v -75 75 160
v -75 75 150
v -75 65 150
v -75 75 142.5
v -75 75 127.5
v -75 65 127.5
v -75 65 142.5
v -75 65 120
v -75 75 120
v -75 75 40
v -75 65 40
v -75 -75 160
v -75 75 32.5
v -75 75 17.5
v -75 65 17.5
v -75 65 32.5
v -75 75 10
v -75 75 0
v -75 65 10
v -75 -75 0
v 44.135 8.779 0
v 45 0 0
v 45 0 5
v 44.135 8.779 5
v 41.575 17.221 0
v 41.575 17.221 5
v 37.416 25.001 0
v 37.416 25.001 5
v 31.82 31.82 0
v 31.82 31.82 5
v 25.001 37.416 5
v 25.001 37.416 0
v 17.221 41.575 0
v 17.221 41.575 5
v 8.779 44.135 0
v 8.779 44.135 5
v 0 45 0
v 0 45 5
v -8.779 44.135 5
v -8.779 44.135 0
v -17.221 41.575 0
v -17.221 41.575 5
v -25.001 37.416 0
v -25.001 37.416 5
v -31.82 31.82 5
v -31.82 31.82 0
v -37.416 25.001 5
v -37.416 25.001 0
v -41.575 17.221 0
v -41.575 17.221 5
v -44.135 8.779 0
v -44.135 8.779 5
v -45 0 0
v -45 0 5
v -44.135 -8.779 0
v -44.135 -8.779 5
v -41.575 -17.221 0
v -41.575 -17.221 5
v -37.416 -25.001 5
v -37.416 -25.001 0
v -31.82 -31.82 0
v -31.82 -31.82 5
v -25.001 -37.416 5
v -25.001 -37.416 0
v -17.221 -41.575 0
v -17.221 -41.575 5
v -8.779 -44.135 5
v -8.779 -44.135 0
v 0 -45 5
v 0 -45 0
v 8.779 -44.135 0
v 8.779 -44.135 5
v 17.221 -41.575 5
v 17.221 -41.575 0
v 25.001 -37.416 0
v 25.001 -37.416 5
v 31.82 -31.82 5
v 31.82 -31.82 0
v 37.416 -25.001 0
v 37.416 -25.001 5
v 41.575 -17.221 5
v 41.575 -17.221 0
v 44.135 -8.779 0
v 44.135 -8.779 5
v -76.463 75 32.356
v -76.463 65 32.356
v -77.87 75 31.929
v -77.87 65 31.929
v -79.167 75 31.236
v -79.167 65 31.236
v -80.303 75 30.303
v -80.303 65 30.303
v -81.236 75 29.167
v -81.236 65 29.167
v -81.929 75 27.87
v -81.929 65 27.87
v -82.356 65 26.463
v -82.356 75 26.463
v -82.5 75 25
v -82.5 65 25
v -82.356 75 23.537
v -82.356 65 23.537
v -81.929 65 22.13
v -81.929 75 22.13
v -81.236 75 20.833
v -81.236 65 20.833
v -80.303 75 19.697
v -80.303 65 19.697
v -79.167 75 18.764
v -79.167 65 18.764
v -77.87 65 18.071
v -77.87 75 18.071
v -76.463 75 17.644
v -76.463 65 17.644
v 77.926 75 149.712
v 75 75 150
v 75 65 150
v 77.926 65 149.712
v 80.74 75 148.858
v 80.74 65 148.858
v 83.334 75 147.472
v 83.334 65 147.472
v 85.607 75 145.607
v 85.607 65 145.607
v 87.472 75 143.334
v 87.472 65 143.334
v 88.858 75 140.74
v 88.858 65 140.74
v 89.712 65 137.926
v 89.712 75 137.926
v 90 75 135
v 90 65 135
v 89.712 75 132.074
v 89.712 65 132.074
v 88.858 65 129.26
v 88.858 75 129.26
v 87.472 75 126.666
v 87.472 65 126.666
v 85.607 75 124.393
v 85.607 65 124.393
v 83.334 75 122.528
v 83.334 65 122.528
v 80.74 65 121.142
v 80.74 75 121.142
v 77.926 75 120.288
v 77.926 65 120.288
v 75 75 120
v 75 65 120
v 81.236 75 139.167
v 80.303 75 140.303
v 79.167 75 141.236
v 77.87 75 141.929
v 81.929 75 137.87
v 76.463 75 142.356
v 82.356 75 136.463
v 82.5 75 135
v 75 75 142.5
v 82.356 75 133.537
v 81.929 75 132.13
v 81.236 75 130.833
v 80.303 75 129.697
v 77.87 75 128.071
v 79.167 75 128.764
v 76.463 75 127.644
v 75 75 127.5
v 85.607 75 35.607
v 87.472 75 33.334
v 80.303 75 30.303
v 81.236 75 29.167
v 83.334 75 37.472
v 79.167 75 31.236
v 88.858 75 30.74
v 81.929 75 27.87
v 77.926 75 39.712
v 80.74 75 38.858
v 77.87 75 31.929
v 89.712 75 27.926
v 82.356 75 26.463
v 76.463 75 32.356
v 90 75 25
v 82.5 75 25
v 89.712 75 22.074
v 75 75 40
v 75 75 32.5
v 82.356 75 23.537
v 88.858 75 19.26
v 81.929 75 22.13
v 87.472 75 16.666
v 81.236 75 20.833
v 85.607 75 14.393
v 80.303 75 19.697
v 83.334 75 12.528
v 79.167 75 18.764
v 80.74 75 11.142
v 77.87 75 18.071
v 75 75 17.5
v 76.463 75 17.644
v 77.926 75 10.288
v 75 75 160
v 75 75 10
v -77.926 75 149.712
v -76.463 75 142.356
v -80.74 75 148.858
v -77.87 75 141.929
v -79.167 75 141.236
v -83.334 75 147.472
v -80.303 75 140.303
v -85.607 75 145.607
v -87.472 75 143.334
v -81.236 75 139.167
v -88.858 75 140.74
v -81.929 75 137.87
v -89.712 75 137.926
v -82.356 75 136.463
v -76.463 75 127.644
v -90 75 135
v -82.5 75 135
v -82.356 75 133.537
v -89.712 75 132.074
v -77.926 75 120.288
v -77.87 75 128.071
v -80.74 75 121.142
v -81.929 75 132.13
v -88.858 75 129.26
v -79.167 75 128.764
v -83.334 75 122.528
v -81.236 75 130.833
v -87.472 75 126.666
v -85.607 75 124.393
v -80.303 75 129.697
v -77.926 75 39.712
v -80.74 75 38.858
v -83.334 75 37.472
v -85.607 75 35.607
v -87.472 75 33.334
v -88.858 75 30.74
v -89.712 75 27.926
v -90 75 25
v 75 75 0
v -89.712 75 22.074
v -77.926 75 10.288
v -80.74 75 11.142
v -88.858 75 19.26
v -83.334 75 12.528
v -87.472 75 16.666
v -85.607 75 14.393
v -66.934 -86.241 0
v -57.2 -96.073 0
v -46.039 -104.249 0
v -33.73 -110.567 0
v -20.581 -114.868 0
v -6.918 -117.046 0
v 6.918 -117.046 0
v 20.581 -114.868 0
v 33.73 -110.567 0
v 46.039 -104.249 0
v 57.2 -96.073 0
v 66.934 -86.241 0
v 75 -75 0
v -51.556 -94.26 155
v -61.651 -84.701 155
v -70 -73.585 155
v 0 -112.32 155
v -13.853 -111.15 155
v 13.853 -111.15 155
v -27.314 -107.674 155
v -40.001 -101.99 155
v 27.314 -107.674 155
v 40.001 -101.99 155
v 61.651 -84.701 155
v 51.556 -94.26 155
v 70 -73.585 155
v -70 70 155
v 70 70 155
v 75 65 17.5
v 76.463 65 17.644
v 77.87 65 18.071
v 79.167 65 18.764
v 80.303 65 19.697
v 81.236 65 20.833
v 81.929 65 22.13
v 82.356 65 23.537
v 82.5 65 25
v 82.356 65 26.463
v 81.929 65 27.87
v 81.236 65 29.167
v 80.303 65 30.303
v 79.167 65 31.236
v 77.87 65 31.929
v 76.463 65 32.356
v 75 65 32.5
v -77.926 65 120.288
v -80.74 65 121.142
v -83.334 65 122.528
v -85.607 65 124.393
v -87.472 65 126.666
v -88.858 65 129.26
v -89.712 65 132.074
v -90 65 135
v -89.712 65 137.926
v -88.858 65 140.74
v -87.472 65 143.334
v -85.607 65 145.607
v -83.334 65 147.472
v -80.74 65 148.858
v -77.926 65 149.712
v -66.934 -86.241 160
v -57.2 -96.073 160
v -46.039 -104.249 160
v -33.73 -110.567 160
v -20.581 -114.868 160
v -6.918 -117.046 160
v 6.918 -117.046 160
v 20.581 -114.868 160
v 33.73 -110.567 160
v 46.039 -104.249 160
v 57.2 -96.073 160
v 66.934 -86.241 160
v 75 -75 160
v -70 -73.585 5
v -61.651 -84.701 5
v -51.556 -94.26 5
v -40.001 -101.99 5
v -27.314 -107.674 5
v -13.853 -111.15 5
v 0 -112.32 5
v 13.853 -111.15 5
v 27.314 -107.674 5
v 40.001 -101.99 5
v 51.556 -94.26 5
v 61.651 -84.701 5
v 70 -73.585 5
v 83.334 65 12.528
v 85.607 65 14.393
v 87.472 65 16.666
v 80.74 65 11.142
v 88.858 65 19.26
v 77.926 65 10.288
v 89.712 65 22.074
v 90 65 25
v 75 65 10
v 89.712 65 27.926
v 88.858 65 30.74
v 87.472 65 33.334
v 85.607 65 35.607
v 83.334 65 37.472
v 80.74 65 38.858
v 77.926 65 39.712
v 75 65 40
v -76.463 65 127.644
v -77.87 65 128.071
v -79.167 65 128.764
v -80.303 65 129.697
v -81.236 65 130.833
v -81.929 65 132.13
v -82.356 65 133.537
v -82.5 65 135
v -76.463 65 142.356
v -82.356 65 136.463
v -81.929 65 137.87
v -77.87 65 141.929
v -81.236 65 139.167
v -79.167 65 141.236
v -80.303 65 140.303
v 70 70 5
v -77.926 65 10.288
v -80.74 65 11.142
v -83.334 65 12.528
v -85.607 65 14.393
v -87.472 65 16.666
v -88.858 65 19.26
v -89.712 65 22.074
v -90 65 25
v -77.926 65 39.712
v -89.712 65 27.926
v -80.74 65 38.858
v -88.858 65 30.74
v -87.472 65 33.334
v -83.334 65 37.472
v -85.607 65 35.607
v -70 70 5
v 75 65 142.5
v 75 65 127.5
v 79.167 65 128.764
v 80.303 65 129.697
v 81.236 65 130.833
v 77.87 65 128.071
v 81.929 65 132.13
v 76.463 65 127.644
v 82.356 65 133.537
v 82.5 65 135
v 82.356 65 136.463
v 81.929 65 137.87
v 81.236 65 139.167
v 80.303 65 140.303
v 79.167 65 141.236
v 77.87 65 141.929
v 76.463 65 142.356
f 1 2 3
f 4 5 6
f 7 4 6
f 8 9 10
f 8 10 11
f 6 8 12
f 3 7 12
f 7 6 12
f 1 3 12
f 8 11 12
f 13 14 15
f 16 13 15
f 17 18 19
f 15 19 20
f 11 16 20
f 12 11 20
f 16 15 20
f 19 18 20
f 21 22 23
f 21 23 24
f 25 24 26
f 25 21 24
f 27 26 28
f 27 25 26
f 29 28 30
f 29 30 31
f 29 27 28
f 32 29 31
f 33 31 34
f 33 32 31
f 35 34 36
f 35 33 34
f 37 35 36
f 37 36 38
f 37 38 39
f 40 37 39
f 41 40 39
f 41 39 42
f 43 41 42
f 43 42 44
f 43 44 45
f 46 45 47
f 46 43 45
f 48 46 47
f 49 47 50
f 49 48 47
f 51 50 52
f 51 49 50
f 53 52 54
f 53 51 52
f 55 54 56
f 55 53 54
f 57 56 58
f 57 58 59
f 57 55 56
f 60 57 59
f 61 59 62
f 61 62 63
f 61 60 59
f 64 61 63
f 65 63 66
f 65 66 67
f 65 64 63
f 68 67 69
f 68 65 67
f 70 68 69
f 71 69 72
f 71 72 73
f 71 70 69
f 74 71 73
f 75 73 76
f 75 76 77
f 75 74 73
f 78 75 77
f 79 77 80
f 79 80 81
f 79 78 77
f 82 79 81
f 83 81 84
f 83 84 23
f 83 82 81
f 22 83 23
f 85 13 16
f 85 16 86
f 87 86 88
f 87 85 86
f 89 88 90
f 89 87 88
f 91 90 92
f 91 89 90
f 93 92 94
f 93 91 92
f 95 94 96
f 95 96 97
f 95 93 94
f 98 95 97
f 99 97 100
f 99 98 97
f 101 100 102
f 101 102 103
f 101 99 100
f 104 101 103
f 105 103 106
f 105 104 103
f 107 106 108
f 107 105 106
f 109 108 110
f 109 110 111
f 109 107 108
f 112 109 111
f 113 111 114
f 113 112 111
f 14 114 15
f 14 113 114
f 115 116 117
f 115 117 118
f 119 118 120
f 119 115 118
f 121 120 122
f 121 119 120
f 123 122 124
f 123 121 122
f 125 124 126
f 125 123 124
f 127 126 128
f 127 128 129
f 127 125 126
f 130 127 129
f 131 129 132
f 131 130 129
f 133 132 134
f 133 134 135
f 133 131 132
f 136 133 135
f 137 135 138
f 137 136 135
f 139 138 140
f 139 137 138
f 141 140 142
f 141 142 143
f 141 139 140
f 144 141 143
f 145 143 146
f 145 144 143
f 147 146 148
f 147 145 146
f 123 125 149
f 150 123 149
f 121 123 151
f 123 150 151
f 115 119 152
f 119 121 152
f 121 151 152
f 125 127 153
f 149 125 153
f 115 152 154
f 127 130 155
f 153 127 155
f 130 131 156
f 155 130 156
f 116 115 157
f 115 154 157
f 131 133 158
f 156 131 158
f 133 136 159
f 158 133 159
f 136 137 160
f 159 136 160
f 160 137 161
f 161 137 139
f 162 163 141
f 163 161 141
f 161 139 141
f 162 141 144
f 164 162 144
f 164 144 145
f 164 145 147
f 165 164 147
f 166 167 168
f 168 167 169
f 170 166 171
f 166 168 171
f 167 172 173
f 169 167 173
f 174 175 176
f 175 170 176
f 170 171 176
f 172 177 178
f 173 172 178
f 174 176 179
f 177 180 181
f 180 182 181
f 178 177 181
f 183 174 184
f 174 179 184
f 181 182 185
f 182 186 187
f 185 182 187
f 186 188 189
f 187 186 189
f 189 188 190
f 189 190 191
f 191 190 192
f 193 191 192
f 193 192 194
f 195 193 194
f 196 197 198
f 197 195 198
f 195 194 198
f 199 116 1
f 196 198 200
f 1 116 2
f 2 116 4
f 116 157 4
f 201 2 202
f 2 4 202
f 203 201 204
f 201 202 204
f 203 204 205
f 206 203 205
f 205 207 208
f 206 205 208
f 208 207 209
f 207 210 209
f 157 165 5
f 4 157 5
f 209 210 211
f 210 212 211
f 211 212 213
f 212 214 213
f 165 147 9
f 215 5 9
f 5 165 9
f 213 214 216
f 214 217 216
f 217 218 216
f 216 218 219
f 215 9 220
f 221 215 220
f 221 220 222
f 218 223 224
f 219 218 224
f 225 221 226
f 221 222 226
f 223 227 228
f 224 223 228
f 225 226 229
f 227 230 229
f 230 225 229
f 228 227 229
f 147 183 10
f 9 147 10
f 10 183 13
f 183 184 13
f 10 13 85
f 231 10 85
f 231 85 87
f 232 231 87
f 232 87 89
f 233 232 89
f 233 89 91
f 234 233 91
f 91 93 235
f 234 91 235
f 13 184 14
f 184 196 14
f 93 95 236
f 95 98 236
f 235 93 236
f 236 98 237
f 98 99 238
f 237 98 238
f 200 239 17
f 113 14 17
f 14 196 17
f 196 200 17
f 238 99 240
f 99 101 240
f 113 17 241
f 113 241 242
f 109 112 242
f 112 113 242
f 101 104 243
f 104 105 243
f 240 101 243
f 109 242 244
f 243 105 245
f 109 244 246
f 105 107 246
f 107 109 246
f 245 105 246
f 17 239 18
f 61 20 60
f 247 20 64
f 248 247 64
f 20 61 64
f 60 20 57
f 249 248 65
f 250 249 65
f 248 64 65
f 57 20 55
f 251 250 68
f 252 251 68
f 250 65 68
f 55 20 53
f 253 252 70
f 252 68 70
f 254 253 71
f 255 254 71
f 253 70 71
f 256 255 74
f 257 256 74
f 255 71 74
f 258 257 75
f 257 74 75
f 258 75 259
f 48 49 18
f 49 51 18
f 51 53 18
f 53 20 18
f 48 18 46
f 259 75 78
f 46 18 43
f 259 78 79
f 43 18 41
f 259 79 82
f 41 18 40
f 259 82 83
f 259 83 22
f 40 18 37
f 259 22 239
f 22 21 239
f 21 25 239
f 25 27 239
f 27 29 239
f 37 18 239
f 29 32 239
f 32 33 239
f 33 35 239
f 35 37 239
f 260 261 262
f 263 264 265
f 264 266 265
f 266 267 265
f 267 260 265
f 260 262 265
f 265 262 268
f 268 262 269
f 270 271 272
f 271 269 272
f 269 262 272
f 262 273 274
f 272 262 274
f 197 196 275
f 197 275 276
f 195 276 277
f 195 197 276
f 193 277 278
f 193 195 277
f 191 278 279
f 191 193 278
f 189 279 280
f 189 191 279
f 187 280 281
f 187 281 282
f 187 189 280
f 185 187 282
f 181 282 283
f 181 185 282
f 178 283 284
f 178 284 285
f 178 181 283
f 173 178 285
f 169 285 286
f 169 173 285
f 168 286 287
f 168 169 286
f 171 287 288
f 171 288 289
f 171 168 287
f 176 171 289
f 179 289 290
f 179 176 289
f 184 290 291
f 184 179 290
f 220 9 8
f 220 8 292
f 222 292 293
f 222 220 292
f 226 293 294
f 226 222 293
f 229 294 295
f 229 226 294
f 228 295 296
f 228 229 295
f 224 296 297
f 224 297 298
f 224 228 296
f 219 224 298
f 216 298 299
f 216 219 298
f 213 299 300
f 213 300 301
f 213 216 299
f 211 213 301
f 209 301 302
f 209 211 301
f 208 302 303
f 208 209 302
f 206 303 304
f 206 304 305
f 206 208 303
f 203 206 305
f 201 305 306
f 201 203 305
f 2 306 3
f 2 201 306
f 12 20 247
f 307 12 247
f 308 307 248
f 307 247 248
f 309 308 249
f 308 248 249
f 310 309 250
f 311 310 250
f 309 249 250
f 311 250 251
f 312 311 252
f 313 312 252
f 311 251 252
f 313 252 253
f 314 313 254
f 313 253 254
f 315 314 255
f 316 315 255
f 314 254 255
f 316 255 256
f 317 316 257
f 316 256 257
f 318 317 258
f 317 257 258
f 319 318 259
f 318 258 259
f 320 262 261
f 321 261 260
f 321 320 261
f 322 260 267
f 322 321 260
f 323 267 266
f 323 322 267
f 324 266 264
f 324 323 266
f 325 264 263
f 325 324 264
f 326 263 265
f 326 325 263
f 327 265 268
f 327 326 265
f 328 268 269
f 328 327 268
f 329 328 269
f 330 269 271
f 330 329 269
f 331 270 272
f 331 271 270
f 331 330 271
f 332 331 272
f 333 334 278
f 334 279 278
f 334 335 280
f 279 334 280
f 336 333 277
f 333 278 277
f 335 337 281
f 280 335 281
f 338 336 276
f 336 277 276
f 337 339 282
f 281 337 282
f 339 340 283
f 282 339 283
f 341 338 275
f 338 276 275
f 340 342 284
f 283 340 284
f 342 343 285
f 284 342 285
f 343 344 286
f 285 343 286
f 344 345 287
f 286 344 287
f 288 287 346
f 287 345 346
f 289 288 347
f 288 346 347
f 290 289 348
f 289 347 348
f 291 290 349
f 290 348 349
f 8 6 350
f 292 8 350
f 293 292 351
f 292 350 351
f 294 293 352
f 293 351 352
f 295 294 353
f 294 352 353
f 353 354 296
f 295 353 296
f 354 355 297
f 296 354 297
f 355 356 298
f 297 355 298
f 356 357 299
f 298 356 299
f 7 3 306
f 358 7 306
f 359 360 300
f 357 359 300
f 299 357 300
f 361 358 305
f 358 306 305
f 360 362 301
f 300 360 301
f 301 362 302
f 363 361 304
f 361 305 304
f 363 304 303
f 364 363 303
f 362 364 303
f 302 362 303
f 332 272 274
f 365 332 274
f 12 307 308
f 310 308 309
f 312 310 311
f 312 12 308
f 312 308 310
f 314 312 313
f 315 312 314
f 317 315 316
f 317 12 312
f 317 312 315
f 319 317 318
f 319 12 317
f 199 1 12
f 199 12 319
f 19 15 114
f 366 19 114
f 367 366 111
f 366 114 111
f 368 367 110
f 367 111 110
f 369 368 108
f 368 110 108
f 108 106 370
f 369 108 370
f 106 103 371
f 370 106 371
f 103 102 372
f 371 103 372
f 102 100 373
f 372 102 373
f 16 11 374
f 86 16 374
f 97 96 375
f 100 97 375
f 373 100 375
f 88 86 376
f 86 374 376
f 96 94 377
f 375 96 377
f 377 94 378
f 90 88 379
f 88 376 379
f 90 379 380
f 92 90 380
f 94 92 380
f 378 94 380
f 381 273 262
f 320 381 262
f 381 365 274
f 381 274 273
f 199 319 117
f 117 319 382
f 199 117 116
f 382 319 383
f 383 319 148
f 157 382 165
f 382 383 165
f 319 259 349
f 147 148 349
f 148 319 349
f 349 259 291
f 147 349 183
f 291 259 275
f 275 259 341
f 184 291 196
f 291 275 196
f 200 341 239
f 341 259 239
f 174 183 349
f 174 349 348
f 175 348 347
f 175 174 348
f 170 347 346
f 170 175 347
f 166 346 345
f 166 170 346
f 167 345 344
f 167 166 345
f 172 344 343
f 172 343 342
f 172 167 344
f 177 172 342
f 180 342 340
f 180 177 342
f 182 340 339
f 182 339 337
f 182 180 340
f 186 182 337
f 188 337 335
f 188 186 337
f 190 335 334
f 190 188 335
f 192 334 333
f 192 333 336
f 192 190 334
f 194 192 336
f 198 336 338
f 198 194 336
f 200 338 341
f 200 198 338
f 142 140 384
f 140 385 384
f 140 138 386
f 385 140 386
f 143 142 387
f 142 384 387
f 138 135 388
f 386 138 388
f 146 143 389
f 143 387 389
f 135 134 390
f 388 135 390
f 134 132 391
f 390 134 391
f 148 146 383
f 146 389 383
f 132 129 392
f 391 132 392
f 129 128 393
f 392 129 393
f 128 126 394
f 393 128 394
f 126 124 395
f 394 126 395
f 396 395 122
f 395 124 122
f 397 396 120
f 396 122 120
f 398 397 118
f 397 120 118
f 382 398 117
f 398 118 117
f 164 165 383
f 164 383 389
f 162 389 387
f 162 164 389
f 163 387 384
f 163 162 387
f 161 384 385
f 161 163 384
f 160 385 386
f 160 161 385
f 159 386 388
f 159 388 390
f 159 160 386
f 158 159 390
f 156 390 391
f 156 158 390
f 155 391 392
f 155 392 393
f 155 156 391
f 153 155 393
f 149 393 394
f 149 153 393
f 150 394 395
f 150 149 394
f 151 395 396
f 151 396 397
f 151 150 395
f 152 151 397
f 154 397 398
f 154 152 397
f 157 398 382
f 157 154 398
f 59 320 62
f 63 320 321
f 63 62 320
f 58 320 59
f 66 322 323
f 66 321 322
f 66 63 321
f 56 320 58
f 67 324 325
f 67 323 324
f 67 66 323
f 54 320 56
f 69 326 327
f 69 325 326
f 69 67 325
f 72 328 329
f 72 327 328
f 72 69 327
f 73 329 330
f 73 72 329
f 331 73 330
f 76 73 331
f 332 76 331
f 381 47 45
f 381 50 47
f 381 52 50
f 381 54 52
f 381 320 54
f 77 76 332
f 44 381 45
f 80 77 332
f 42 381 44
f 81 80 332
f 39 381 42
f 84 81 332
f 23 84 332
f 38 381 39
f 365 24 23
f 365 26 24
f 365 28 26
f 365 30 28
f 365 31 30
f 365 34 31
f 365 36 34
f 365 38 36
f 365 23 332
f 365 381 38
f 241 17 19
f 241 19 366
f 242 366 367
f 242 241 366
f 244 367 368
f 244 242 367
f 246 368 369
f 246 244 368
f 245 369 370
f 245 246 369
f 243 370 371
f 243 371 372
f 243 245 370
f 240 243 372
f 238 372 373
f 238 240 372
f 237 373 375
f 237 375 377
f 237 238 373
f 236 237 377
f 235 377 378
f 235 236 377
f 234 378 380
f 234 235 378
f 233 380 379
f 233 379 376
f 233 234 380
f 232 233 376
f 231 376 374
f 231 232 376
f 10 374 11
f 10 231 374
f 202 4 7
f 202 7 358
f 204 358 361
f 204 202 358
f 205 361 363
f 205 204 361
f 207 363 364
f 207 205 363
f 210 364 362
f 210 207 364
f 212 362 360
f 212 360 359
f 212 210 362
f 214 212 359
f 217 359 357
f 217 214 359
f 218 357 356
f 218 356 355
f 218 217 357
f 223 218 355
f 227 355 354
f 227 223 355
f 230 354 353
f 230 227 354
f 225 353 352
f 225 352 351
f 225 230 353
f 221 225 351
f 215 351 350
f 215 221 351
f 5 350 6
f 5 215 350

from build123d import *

# Parameters (mm, degrees)
F0_R     = 45
F1_DEPTH = 160
F2_T     = -5
F3_DEPTH = 5
F5_DEPTH = 10


with BuildPart() as f1:
    # F0 (on Top) → F1 (new body)
    with BuildSketch(Plane.XY):
        with BuildLine():
            Line((75, -75), (75, 75))
            Line((75, 75), (-75, 75))
            Line((-75, 75), (-75, -75))
            ThreePointArc((-75, -75), (0, -117.319724), (75, -75))
        make_face()
        Circle(F0_R, mode=Mode.SUBTRACT)
        Circle(F0_R)
    extrude(amount=F1_DEPTH)

    # F2
    f2_openings = [f1.faces().sort_by_distance(p)[0] for p in [
        (0, -15.361785, 0),
    ]]
    offset(amount=F2_T, openings=f2_openings)

    # F0 (on Top) → F3 (join)
    with BuildSketch(Plane.XY):
        with BuildLine():
            Line((75, -75), (75, 75))
            Line((75, 75), (-75, 75))
            Line((-75, 75), (-75, -75))
            ThreePointArc((-75, -75), (0, -117.319724), (75, -75))
        make_face()
        Circle(F0_R, mode=Mode.SUBTRACT)
    extrude(amount=F3_DEPTH)

    # F4 (on face) → F5 (join)
    with BuildSketch(Plane(origin=(0, 75, 0), x_dir=(-1, 0, 0), z_dir=(0, 1, 0))):
        with BuildLine():
            ThreePointArc((-75, 150), (-90, 135), (-75, 120))
            Line((-75, 120), (-75, 127.5))
            ThreePointArc((-75, 127.5), (-82.5, 135), (-75, 142.5))
            Line((-75, 142.5), (-75, 150))
        make_face()
        with BuildLine():
            Line((75, 127.5), (75, 120))
            ThreePointArc((75, 120), (90, 135), (75, 150))
            Line((75, 150), (75, 142.5))
            ThreePointArc((75, 142.5), (82.5, 135), (75, 127.5))
        make_face()
        with BuildLine():
            ThreePointArc((-75, 40), (-90, 25), (-75, 10))
            Line((-75, 10), (-75, 17.5))
            ThreePointArc((-75, 17.5), (-82.5, 25), (-75, 32.5))
            Line((-75, 32.5), (-75, 40))
        make_face()
        with BuildLine():
            Line((75, 17.5), (75, 10))
            ThreePointArc((75, 10), (90, 25), (75, 40))
            Line((75, 40), (75, 32.5))
            ThreePointArc((75, 32.5), (82.5, 25), (75, 17.5))
        make_face()
    extrude(amount=-F5_DEPTH)


solid = f1.part
